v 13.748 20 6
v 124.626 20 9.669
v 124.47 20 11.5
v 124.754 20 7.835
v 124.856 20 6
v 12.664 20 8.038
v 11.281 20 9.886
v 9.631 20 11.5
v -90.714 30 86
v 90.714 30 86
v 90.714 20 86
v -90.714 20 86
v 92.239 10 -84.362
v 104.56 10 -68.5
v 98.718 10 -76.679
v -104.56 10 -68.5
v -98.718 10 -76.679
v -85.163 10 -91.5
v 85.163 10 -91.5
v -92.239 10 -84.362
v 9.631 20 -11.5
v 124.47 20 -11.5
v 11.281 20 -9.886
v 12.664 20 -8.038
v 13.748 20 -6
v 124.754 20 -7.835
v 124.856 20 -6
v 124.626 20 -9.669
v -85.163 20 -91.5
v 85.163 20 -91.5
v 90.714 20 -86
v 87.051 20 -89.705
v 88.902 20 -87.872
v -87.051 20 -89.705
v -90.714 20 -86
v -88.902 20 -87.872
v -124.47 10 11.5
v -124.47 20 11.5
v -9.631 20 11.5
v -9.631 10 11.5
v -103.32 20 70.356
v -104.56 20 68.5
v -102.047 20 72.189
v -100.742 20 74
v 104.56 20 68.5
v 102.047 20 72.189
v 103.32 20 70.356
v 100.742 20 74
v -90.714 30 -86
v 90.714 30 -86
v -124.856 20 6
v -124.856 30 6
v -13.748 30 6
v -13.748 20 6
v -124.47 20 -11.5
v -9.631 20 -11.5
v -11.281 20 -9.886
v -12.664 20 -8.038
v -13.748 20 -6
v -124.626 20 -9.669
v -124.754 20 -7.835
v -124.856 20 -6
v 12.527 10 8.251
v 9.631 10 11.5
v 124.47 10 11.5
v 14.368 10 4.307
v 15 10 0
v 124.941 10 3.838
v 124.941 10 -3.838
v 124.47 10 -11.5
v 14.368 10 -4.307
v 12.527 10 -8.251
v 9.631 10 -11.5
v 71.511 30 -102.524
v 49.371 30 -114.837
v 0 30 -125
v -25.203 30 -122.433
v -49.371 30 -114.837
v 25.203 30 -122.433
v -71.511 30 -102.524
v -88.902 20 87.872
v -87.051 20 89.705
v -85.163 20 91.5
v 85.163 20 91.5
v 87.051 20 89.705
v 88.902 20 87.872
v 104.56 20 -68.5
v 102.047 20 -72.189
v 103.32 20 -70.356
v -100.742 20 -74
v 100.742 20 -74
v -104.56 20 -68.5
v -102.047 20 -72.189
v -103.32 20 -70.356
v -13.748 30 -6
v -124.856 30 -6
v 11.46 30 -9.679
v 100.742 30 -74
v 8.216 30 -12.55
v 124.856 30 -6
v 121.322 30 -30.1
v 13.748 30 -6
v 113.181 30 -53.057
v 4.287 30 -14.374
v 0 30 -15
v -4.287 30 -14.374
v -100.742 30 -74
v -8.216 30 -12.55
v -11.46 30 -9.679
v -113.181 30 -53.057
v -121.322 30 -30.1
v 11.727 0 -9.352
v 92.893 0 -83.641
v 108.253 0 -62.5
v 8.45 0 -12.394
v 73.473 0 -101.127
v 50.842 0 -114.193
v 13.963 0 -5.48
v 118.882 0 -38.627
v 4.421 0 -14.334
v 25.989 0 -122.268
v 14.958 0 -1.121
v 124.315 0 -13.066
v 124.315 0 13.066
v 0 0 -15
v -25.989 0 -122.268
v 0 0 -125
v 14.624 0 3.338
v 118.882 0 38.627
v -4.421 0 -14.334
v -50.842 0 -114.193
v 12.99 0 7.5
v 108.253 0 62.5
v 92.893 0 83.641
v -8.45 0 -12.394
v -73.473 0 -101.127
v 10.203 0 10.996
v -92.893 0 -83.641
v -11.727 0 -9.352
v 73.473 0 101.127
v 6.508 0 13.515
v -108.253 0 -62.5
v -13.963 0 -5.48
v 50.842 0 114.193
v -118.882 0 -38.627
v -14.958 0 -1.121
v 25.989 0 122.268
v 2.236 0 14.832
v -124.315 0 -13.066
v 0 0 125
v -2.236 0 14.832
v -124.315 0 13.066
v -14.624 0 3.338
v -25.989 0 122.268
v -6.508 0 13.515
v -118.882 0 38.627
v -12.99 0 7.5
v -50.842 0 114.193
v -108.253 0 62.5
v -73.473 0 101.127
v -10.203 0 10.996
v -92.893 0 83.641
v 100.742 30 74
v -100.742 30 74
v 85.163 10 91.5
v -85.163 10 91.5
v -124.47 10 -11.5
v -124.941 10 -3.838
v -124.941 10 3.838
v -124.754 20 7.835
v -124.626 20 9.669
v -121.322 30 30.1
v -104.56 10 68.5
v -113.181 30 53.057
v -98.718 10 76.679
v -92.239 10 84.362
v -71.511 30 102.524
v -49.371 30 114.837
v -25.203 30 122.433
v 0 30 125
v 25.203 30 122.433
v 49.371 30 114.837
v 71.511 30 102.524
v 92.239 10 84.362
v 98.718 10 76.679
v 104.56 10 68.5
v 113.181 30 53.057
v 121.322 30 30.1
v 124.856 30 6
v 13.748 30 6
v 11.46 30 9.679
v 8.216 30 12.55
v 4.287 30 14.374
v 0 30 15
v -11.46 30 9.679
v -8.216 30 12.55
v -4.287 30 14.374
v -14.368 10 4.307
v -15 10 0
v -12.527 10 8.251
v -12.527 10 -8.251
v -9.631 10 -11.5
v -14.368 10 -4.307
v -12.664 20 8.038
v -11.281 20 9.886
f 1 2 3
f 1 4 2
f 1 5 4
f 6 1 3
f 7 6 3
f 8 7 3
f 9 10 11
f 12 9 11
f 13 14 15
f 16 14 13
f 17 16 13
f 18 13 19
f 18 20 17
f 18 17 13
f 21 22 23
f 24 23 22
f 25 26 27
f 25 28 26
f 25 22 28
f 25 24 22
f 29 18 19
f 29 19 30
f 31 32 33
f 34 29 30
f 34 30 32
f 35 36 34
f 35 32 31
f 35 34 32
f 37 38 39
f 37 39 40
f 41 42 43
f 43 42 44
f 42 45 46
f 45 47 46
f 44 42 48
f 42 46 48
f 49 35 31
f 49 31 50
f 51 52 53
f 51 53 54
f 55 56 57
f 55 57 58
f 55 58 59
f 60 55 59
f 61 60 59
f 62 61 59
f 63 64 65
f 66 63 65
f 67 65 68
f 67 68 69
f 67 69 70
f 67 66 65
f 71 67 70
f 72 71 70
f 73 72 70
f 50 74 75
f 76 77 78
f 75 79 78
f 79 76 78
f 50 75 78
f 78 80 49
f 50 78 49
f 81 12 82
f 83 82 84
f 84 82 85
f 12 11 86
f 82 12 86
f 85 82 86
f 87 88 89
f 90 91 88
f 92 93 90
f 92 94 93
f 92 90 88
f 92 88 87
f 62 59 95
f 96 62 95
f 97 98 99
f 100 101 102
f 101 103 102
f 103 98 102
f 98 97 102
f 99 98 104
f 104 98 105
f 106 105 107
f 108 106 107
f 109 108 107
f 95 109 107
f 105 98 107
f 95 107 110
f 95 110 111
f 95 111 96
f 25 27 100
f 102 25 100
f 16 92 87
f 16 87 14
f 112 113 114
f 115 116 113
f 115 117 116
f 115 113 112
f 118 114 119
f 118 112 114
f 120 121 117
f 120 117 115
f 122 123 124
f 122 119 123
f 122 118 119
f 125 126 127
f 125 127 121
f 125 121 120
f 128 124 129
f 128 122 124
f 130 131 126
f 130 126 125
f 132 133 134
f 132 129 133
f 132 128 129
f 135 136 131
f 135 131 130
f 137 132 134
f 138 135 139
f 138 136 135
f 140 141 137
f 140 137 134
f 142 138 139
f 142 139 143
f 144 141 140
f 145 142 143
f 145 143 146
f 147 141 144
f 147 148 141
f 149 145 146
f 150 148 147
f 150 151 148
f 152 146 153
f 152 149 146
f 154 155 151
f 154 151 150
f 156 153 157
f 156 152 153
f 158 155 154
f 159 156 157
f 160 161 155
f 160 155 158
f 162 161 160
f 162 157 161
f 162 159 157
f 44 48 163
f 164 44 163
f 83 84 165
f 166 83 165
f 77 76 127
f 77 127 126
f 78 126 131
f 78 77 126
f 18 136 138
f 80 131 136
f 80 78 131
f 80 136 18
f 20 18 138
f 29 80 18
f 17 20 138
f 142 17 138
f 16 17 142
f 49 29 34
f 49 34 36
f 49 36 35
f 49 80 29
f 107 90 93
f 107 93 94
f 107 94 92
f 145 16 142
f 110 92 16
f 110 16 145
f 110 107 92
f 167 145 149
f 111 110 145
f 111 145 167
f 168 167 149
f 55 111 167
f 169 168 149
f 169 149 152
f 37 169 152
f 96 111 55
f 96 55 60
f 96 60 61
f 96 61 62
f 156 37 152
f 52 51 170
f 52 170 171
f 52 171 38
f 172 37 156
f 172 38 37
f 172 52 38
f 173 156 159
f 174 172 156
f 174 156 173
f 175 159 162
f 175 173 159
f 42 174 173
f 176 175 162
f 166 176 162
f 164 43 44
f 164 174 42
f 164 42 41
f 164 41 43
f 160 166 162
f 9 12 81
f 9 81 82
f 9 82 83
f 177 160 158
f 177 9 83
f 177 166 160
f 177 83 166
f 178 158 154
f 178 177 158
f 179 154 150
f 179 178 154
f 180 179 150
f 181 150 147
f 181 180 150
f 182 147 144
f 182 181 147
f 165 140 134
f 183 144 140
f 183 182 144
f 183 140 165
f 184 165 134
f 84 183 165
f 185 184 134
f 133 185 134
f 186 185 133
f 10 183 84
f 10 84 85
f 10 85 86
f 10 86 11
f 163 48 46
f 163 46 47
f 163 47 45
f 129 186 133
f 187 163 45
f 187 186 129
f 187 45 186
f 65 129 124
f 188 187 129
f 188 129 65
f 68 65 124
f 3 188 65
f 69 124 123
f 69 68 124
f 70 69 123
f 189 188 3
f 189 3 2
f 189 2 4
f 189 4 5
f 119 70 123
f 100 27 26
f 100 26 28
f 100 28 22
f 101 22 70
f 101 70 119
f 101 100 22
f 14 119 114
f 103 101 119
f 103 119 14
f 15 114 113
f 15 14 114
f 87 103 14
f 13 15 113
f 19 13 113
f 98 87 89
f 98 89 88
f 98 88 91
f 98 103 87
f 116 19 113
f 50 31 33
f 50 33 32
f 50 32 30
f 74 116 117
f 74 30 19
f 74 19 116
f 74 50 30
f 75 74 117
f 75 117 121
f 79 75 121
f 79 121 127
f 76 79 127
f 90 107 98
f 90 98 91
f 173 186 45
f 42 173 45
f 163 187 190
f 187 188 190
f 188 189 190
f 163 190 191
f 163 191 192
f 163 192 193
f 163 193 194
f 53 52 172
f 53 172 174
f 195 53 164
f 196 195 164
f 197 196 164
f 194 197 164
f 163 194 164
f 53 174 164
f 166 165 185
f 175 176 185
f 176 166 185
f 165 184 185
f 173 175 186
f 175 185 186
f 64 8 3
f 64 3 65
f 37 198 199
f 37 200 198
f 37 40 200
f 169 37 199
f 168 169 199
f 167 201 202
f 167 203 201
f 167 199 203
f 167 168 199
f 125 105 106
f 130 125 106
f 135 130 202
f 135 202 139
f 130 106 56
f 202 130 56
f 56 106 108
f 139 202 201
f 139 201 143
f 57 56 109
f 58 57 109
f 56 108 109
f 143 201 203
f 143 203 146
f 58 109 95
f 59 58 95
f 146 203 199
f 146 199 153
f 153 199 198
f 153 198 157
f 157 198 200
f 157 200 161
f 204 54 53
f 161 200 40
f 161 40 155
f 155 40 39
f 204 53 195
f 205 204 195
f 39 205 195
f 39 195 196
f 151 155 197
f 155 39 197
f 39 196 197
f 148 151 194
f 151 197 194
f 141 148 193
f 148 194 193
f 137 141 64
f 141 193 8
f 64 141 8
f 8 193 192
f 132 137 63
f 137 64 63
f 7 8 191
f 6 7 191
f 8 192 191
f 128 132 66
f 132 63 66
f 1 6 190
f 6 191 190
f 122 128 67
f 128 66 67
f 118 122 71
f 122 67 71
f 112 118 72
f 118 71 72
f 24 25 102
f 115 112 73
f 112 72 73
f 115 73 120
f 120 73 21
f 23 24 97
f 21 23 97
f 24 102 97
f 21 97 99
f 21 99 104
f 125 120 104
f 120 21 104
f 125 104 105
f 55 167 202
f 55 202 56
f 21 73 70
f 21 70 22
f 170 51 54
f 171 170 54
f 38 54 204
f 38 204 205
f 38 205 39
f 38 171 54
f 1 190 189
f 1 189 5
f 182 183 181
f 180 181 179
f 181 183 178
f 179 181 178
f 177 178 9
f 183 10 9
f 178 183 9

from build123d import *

# Parameters (mm, degrees)
SKETCH_1_W          = 110
SKETCH_1_H          = 30
CUT_EXTRUDE_1_DEPTH = 150


with BuildPart() as part:
    # Эскиз1 → Повернуть1 (revolve)
    with BuildSketch(Plane(origin=(0, 0, 0), x_dir=(0, 0, -1), z_dir=(1, 0, 0))):
        with Locations((70, 15)):
            Rectangle(SKETCH_1_W, SKETCH_1_H)
    revolve(axis=Axis((0, -12.628115938, 0), (0, 1, 0)))

    # Эскиз2 → Вырез-Вытянуть1 (cut, symmetric)
    with BuildSketch(Plane(origin=(0, 0, 0), x_dir=(0, 0, -1), z_dir=(1, 0, 0))):
        Polygon((11.5, 10), (11.5, 20), (6, 20), (6, 30), (-6, 30), (-6, 20), (-11.5, 20), (-11.5, 10), align=None)
        Polygon((68.5, 10), (91.5, 10), (91.5, 20), (86, 20), (86, 30), (74, 30), (74, 20), (68.5, 20), align=None)
        Polygon((-91.5, 10), (-68.5, 10), (-68.5, 20), (-74, 20), (-74, 30), (-86, 30), (-86, 20), (-91.5, 20), align=None)
    extrude(amount=CUT_EXTRUDE_1_DEPTH, both=True, mode=Mode.SUBTRACT)


solid = part.part
